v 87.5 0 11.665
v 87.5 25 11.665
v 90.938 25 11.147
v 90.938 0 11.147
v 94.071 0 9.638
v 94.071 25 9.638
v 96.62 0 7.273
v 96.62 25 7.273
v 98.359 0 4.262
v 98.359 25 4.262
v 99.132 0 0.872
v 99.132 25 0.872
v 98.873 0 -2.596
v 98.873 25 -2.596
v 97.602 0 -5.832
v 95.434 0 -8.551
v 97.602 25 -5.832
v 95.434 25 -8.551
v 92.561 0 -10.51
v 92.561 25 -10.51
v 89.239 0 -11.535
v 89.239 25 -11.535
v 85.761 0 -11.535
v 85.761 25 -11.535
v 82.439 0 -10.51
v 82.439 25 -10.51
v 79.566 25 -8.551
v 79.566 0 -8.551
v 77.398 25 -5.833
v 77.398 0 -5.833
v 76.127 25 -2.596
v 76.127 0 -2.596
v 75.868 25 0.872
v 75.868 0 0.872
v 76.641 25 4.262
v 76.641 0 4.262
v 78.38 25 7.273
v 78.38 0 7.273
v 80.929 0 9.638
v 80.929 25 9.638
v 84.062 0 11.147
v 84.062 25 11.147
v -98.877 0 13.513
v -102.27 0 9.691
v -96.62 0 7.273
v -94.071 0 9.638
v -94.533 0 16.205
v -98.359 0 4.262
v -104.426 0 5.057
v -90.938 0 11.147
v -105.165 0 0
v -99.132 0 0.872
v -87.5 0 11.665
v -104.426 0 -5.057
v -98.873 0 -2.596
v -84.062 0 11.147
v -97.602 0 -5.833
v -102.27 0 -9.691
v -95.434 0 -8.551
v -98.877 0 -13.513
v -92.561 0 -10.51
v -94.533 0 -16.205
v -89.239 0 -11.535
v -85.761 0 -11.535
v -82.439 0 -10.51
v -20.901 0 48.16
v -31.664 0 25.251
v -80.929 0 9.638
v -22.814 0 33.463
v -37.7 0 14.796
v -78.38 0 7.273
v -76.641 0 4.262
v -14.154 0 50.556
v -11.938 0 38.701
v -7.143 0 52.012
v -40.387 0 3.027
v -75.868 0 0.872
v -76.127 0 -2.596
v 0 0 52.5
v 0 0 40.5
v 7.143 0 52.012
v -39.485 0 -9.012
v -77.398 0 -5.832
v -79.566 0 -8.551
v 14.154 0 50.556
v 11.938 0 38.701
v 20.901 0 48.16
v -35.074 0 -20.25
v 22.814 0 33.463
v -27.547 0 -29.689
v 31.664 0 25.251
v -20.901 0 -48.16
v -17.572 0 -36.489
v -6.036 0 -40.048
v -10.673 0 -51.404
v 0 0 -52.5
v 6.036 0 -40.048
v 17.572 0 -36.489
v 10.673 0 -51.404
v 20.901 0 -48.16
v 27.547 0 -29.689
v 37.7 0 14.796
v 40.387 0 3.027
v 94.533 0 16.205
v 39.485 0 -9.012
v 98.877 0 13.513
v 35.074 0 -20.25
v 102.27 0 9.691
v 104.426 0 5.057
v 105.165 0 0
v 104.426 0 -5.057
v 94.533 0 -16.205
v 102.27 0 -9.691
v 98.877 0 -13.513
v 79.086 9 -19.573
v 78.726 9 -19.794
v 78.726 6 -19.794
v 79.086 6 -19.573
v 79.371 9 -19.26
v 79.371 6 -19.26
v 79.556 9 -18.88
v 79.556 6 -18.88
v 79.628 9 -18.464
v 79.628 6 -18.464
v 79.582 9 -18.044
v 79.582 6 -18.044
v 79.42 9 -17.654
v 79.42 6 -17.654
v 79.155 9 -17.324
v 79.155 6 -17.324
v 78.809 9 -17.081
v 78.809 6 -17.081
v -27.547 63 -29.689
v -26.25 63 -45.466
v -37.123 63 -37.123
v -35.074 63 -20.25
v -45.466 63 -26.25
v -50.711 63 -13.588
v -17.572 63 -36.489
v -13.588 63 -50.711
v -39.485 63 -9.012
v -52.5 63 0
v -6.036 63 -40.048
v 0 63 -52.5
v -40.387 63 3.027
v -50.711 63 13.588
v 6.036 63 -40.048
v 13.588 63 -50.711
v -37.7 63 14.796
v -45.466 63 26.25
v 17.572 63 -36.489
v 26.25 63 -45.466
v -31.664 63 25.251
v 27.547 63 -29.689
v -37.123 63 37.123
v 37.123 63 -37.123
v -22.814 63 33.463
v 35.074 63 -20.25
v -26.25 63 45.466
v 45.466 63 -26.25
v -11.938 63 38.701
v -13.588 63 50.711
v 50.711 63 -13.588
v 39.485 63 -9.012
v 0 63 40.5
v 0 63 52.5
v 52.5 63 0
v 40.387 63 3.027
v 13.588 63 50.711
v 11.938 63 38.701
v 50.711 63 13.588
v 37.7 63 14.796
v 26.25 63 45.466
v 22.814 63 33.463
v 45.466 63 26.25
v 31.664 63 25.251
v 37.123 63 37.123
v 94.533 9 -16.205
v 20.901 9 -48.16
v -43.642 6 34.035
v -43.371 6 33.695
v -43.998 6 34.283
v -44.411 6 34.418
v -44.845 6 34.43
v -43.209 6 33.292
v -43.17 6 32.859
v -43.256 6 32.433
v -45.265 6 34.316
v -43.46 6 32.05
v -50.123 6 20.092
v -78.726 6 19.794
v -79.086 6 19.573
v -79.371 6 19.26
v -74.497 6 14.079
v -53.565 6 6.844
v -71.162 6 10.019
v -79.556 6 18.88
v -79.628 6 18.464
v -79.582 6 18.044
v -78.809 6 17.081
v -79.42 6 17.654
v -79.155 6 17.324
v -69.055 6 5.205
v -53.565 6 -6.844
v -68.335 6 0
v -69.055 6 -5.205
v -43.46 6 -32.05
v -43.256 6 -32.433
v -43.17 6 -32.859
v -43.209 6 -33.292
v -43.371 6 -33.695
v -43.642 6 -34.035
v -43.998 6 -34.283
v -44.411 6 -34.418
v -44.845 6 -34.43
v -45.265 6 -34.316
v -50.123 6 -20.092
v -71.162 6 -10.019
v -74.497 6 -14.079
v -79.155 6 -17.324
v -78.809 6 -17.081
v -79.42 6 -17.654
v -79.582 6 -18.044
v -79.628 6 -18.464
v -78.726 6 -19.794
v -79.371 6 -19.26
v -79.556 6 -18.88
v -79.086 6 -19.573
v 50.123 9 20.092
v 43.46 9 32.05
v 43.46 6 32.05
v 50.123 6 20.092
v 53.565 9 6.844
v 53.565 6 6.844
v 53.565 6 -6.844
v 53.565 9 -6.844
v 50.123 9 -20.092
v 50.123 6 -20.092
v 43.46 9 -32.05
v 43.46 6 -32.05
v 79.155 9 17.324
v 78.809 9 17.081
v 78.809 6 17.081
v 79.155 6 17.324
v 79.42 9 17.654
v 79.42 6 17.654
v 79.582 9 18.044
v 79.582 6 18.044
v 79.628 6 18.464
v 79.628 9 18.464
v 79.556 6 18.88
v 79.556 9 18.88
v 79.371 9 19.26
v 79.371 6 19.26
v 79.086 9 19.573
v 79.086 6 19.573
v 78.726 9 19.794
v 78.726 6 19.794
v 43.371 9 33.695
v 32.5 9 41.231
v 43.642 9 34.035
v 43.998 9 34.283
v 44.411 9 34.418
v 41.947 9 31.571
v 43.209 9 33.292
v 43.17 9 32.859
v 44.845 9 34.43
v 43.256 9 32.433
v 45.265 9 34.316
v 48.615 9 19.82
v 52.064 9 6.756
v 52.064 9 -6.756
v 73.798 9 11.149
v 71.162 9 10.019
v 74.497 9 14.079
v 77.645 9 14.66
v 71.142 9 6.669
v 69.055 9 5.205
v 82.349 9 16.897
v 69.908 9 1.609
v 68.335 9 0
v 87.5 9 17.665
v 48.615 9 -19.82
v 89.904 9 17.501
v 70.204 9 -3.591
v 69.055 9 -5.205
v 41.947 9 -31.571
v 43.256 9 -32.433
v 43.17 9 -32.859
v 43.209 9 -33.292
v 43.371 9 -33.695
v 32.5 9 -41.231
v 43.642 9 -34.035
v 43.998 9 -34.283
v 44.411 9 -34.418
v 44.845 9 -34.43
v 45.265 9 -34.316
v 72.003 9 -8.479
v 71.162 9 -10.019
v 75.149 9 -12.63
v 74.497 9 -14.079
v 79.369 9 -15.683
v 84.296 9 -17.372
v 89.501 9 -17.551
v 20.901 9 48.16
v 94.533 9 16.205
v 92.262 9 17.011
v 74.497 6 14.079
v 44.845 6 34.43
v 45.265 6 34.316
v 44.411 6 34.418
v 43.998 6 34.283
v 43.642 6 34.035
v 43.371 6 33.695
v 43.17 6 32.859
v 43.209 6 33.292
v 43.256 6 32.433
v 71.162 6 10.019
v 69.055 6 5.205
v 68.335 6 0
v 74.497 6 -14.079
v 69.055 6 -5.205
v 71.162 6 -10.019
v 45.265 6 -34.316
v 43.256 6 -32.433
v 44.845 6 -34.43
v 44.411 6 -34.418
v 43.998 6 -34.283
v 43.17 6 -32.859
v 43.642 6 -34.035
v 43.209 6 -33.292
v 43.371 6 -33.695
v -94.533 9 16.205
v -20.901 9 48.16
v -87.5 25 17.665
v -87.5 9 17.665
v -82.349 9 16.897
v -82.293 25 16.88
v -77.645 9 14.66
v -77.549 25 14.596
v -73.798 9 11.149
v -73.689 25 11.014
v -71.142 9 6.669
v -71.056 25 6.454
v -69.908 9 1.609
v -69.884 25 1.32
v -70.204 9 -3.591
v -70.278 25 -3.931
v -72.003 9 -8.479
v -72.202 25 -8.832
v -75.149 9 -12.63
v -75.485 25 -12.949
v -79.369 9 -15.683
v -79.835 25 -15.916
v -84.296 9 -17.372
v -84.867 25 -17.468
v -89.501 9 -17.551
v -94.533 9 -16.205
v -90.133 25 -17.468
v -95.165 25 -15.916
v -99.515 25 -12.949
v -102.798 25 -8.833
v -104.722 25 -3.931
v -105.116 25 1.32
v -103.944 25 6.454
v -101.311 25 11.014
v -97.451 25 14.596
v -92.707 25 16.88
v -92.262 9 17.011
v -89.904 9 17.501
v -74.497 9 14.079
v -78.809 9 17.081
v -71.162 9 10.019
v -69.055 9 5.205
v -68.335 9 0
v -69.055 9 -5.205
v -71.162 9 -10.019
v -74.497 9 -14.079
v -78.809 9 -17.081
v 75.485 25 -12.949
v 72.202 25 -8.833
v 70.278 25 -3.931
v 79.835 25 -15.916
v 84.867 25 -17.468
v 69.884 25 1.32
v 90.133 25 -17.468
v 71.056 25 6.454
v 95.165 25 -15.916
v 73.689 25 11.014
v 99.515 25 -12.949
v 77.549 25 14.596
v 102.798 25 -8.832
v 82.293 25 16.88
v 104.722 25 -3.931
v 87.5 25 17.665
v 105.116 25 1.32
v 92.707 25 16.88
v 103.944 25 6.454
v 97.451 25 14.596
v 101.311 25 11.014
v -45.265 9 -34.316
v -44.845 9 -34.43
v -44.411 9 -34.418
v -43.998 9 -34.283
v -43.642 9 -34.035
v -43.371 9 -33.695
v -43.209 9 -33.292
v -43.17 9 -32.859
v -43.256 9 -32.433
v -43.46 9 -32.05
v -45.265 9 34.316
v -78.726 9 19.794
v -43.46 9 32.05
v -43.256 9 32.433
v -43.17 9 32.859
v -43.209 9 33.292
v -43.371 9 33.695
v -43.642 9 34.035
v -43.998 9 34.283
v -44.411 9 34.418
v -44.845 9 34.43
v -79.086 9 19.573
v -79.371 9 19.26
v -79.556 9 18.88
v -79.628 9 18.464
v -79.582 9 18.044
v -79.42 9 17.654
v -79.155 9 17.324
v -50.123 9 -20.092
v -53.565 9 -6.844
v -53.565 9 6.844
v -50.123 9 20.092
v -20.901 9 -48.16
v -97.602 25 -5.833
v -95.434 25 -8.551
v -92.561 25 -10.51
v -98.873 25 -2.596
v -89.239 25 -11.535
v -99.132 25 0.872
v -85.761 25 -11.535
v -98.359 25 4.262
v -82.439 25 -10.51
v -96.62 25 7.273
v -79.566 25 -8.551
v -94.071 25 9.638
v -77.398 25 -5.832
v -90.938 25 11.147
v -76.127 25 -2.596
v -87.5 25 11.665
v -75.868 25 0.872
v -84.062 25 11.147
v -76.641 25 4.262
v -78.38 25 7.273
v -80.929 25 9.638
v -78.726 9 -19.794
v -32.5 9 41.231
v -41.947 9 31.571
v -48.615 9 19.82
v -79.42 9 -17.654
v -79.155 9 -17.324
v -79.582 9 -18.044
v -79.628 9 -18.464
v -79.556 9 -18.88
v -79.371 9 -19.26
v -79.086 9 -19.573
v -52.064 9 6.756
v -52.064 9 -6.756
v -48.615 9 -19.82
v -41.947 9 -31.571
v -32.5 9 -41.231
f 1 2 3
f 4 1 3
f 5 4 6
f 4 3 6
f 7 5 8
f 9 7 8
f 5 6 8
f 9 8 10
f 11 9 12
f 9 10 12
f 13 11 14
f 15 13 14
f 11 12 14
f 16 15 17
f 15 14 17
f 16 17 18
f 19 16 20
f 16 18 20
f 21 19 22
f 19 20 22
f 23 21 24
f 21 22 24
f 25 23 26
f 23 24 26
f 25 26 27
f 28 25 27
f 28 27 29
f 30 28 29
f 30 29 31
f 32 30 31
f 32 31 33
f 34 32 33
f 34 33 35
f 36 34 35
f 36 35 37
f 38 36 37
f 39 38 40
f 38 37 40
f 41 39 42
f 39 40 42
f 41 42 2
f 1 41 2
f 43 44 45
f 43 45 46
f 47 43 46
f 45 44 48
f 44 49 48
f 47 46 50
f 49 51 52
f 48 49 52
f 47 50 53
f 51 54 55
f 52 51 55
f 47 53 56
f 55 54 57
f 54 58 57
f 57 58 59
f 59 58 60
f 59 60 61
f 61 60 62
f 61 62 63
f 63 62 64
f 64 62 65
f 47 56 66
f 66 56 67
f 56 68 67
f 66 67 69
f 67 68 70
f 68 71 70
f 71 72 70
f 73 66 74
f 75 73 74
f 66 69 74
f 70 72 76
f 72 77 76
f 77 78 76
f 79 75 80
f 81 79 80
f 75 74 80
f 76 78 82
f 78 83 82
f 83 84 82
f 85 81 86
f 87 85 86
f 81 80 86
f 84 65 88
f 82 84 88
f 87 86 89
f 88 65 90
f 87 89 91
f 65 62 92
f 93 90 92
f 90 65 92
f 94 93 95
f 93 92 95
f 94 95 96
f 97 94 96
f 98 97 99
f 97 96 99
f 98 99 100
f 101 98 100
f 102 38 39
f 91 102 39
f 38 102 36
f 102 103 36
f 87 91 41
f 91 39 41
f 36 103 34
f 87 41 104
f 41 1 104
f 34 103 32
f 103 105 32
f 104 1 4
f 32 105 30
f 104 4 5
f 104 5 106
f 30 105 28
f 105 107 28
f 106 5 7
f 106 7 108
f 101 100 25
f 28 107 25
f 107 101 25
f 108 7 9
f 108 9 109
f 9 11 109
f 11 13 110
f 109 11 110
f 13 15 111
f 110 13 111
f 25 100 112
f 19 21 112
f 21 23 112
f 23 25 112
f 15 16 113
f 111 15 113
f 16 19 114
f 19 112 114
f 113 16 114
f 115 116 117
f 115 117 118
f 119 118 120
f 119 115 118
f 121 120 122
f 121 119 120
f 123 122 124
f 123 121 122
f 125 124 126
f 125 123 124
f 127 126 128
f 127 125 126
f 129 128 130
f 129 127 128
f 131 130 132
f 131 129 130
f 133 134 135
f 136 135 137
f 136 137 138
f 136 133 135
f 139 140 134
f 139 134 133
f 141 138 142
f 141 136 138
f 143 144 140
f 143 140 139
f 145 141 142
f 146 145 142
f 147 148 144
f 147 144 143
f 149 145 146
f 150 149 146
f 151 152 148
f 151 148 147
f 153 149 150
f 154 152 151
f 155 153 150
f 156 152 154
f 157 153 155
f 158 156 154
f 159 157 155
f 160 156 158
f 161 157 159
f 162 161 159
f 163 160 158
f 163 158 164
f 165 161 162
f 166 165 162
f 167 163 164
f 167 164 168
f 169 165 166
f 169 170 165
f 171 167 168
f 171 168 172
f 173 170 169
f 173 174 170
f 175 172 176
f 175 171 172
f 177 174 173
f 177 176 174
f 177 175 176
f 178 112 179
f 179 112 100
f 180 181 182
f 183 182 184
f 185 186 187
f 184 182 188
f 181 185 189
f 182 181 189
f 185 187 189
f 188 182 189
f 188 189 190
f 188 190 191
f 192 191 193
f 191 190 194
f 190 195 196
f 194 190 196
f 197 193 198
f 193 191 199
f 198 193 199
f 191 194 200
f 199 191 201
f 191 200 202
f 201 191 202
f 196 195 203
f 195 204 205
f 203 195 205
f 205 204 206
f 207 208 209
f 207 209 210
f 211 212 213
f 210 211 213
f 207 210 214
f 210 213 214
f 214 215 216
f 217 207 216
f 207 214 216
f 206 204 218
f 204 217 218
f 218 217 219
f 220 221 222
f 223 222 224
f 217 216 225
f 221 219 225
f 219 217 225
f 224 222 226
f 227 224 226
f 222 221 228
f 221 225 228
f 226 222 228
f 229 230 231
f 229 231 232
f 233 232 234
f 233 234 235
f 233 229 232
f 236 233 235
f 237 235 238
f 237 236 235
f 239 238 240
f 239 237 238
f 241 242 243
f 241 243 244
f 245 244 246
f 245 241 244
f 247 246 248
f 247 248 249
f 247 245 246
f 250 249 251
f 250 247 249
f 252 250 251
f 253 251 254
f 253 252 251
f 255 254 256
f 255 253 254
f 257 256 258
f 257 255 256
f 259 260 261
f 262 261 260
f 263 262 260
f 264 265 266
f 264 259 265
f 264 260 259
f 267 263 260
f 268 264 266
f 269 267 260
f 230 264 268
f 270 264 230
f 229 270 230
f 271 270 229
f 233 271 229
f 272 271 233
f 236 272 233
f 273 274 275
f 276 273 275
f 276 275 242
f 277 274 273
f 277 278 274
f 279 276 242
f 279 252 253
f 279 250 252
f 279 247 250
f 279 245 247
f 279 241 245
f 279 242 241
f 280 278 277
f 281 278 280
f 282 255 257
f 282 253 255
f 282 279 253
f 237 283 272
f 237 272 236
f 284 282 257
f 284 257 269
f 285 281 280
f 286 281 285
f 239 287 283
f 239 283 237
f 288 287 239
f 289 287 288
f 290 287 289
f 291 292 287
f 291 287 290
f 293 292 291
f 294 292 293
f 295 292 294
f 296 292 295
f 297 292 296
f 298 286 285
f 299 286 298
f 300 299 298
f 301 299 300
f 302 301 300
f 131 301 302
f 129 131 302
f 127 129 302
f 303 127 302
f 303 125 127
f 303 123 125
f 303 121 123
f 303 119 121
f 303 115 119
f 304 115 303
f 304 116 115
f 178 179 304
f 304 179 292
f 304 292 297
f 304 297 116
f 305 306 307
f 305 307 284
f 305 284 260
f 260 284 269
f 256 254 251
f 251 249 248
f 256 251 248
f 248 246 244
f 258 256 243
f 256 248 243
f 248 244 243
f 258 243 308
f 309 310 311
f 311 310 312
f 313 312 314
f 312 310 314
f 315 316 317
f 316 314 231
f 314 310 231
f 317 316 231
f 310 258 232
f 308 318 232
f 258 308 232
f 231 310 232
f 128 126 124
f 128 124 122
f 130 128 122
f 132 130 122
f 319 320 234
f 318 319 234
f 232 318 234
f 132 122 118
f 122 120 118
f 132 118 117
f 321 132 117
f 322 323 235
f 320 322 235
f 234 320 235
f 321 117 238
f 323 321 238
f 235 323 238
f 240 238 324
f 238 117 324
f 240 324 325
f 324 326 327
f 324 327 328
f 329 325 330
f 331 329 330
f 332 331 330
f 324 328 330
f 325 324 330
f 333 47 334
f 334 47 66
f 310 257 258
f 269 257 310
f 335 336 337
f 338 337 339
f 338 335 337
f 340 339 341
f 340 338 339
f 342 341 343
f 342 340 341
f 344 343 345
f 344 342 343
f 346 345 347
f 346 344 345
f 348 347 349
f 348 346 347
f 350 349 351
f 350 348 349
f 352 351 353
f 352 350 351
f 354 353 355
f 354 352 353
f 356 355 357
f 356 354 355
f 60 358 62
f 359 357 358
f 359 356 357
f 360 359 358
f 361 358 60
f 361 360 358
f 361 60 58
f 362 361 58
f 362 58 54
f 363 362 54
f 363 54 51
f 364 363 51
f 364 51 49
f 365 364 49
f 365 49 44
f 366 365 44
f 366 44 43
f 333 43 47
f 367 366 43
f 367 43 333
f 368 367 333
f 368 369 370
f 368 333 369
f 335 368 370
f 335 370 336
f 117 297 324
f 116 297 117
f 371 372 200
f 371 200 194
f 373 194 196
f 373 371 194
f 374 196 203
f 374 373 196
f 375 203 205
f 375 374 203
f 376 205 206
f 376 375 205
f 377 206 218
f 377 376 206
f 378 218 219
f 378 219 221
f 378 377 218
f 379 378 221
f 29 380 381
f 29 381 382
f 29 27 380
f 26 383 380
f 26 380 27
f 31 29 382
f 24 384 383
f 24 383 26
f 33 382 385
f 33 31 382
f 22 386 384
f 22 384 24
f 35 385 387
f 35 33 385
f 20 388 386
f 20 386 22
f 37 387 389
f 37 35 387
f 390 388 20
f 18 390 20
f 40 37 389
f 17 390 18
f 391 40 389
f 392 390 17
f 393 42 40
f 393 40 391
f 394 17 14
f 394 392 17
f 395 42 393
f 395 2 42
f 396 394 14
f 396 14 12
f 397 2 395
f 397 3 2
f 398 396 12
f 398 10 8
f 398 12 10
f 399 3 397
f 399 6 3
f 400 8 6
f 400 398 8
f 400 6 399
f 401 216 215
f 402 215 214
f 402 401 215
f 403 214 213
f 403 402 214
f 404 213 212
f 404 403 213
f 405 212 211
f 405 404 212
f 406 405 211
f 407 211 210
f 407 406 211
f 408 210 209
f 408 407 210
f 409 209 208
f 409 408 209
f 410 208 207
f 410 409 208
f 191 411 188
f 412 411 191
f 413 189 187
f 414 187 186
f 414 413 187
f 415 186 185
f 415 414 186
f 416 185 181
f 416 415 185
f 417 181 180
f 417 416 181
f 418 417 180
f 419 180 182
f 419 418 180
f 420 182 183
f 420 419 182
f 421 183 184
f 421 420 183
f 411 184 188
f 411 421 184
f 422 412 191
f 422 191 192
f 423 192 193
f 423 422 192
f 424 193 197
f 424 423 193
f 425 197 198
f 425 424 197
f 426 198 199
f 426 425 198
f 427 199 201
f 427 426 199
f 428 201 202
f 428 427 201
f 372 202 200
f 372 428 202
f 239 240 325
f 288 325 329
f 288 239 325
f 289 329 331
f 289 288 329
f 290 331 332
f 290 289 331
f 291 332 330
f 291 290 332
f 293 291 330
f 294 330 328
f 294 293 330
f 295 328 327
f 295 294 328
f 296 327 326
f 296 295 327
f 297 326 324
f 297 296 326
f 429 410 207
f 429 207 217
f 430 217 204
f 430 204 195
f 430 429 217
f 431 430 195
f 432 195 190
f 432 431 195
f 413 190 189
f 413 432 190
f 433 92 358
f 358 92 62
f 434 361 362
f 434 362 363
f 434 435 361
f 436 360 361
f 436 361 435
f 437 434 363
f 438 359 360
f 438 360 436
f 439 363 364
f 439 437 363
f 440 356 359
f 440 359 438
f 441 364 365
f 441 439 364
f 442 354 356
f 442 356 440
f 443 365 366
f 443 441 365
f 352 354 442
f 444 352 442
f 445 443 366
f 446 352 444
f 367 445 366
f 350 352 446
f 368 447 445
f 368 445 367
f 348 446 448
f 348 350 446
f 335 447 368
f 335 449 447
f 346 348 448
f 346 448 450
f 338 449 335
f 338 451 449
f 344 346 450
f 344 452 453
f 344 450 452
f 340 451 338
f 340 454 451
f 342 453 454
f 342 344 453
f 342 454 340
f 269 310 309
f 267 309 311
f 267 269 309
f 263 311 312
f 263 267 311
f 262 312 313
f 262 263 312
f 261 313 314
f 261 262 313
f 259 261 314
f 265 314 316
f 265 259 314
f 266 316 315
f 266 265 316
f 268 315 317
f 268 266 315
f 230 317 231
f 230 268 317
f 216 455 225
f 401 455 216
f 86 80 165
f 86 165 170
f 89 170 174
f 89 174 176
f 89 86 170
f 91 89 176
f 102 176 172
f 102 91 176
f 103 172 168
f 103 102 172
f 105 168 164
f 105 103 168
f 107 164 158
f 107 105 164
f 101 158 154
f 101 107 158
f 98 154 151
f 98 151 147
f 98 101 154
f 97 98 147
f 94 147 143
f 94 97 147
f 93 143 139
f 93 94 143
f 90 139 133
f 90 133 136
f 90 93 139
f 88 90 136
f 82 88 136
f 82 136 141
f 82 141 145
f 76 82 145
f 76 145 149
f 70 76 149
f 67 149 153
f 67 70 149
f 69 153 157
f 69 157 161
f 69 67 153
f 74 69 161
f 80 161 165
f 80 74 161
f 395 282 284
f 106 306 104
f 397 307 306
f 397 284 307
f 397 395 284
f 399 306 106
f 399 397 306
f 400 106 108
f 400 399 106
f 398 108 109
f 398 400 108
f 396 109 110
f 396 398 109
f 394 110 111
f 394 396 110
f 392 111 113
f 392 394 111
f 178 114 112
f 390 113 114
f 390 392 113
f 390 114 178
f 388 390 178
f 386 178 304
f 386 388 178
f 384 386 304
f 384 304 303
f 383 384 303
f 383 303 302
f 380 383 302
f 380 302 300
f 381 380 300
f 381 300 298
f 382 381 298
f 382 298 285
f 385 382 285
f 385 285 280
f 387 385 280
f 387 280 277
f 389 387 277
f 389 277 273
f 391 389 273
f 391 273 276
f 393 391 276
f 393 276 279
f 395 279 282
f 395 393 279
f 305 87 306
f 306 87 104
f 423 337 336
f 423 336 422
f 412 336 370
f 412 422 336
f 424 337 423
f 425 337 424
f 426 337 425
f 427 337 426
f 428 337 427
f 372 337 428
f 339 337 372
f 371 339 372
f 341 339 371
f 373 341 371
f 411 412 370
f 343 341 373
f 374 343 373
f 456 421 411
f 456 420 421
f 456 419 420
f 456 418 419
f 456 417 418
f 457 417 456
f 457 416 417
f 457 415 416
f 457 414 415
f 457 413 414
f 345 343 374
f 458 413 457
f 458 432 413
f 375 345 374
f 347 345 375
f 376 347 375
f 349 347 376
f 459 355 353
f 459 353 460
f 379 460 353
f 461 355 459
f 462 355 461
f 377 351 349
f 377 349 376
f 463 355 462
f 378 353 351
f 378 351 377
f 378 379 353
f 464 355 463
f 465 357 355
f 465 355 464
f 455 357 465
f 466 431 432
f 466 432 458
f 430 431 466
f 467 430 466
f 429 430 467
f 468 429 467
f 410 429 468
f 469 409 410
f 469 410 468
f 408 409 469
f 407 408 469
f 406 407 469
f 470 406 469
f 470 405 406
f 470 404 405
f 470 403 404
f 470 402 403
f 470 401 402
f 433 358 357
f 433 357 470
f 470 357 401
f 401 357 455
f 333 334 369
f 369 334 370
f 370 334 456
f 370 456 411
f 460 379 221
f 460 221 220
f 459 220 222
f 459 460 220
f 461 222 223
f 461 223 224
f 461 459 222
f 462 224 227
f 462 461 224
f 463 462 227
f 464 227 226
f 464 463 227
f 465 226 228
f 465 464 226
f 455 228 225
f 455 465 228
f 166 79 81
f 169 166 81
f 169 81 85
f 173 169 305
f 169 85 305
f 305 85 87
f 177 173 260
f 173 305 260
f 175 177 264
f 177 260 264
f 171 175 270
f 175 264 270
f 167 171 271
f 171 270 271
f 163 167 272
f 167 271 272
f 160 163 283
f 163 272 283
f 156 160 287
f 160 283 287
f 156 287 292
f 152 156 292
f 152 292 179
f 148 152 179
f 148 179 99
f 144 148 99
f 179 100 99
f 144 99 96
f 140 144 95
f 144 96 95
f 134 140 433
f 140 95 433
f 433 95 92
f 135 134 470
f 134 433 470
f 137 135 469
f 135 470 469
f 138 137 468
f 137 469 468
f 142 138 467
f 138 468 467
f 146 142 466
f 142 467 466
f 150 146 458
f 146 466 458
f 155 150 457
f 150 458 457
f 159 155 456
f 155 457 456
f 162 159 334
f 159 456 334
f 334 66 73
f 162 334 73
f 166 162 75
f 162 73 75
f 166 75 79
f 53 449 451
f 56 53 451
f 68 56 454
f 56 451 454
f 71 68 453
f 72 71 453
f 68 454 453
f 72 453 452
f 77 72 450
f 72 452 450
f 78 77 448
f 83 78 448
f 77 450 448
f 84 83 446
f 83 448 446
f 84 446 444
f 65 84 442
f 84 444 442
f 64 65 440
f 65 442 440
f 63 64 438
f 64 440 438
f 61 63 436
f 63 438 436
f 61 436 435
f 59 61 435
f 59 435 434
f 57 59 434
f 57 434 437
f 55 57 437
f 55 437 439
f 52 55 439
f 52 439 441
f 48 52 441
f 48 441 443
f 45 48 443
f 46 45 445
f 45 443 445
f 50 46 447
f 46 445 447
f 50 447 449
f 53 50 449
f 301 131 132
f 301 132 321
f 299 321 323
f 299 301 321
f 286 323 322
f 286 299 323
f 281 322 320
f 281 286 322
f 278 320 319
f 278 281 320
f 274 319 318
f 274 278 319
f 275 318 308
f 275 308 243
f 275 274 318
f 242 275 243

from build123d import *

# Parameters (mm, degrees)
SKETCH1_R             = 52.5
SKETCH1_R_2           = 40.5
BOSS_EXTRUDE1_DEPTH   = 63
SKETCH2_R             = 17.665
SKETCH2_R_2           = 11.665
BOSS_EXTRUDE2_DEPTH   = 25
BOSS_EXTRUDE2_2_DEPTH = 25
BOSS_EXTRUDE3_DEPTH   = 9
CUT_EXTRUDE1_DEPTH    = 57


with BuildPart() as part:
    # Sketch1 → Boss-Extrude1 (new body)
    with BuildSketch(Plane(origin=(0, 0, 0), x_dir=(1, 0, 0), z_dir=(0, 1, 0))):
        with Locations(Location((0, 0, 0), (0, 0, 270))):
            Circle(SKETCH1_R)
        with Locations(Location((0, 0, 0), (0, 0, 270))):
            Circle(SKETCH1_R_2, mode=Mode.SUBTRACT)
    extrude(amount=BOSS_EXTRUDE1_DEPTH)



with BuildPart() as body_2:
    # Sketch2 → Boss-Extrude2 (new body)
    with BuildSketch(Plane(origin=(0, 25, 0), x_dir=(1, 0, 0), z_dir=(0, 1, 0))):
        with Locations(Location((87.5, 0, 0), (0, 0, 270))):
            Circle(SKETCH2_R)
        with Locations(Location((87.5, 0, 0), (0, 0, 270))):
            Circle(SKETCH2_R_2, mode=Mode.SUBTRACT)
    extrude(amount=-BOSS_EXTRUDE2_DEPTH)


with BuildPart() as body_3:
    # Sketch2 → Boss-Extrude2 2 (new body)
    with BuildSketch(Plane(origin=(0, 25, 0), x_dir=(1, 0, 0), z_dir=(0, 1, 0))):
        with Locations(Location((-87.5, 0, 0), (0, 0, 270))):
            Circle(SKETCH2_R)
        with Locations(Location((-87.5, 0, 0), (0, 0, 270))):
            Circle(SKETCH2_R_2, mode=Mode.SUBTRACT)
    extrude(amount=-BOSS_EXTRUDE2_2_DEPTH)


with BuildPart() as part_1:
    add(part.part)

    add(body_2.part)  # Boss-Extrude3 merges body 2

    add(body_3.part)  # Boss-Extrude3 merges body 3
    # Sketch3 → Boss-Extrude3 (add)
    with BuildSketch(Plane(origin=(0, 0, 0), x_dir=(-1, 0, 0), z_dir=(0, -1, 0))):
        with BuildLine():
            Line((-94.532688857, 16.204737346), (-20.901, 48.160130803))
            ThreePointArc((-20.901, 48.160130803), (-52.5, 0), (-20.901, -48.160130803))
            Line((-20.901, -48.160130803), (-94.532688857, -16.204737346))
            ThreePointArc((-94.532688857, -16.204737346), (-69.835, 0), (-94.532688857, 16.204737346))
        make_face()
        with BuildLine():
            Line((20.901, 48.160130803), (94.532688857, 16.204737346))
            ThreePointArc((94.532688857, 16.204737346), (69.835, 0), (94.532688857, -16.204737346))
            Line((94.532688857, -16.204737346), (20.901, -48.160130803))
            ThreePointArc((20.901, -48.160130803), (52.5, 0), (20.901, 48.160130803))
        make_face()
    extrude(amount=-BOSS_EXTRUDE3_DEPTH)

    # Sketch4 → Cut-Extrude1 (cut)
    with BuildSketch(Plane(origin=(0, 63, 0), x_dir=(1, 0, 0), z_dir=(0, 1, 0))):
        with BuildLine():
            Line((-78.726335185, 19.794191843), (-45.264792214, 34.316156339))
            ThreePointArc((-45.264792214, 34.316156339), (-43.494143933, 33.874471647), (-43.460387791, 32.049878207))
            ThreePointArc((-43.460387791, 32.049878207), (-54, 0), (-43.460387791, -32.049878207))
            ThreePointArc((-43.460387791, -32.049878207), (-43.494143933, -33.874471647), (-45.264792214, -34.316156339))
            Line((-45.264792214, -34.316156339), (-78.726335185, -19.794191843))
            ThreePointArc((-78.726335185, -19.794191843), (-79.628461818, -18.464071905), (-78.809359951, -17.081276315))
            ThreePointArc((-78.809359951, -17.081276315), (-68.335, 0), (-78.809359951, 17.081276315))
            ThreePointArc((-78.809359951, 17.081276315), (-79.628461818, 18.464071905), (-78.726335185, 19.794191843))
        make_face()
        with BuildLine():
            Line((78.726335185, -19.794191843), (45.264792214, -34.316156339))
            ThreePointArc((45.264792214, -34.316156339), (43.494143933, -33.874471647), (43.460387791, -32.049878207))
            ThreePointArc((43.460387791, -32.049878207), (54, 0), (43.460387791, 32.049878207))
            ThreePointArc((43.460387791, 32.049878207), (43.494143933, 33.874471647), (45.264792214, 34.316156339))
            Line((45.264792214, 34.316156339), (78.726335185, 19.794191843))
            ThreePointArc((78.726335185, 19.794191843), (79.628461818, 18.464071905), (78.809359951, 17.081276315))
            ThreePointArc((78.809359951, 17.081276315), (68.335, 0), (78.809359951, -17.081276315))
            ThreePointArc((78.809359951, -17.081276315), (79.628461818, -18.464071905), (78.726335185, -19.794191843))
        make_face()
    extrude(amount=-CUT_EXTRUDE1_DEPTH, mode=Mode.SUBTRACT)


solid = part_1.part
